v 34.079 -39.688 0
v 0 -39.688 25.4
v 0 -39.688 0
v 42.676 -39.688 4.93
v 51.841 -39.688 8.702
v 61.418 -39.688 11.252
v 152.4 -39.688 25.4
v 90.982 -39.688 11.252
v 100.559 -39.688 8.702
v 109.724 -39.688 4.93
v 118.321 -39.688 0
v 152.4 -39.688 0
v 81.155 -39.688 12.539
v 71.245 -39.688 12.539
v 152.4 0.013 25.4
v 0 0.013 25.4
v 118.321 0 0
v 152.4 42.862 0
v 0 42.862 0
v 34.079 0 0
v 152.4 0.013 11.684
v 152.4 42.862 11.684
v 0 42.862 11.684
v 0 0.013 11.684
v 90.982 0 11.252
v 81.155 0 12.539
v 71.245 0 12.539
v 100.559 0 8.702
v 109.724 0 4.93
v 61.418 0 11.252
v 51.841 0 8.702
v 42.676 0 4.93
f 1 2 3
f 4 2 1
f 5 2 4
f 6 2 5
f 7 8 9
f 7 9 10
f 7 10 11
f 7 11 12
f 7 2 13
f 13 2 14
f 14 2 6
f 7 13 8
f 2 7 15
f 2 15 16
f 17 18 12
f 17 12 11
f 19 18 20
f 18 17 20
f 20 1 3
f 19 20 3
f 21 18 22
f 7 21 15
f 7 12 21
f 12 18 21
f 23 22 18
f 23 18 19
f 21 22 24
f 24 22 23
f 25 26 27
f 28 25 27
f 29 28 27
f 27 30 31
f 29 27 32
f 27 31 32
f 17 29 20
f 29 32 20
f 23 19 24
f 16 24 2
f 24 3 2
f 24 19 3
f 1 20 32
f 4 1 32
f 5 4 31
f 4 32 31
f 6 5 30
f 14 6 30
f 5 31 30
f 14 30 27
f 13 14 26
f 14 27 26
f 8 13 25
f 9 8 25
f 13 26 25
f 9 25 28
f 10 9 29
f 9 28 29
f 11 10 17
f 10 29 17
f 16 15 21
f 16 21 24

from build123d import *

# Parameters (mm, degrees)
F1_DEPTH = 39.6875
F2_W     = 152.4
F2_H     = 25.4
F3_DEPTH = 42.8625
F4_W     = 152.4
F4_H     = 13.716
F5_DEPTH = 42.8498


with BuildPart() as f1:
    # F0 (on Front) → F1 (new body)
    with BuildSketch(Plane.XZ):
        with BuildLine():
            Line((0, 25.4), (0, 0))
            Line((0, 0), (34.078865, 0))
            ThreePointArc((34.078865, 0), (76.2, 12.7), (118.321135, 0))
            Line((118.321135, 0), (152.4, 0))
            Line((152.4, 0), (152.4, 25.4))
            Line((152.4, 25.4), (0, 25.4))
        make_face()
    extrude(amount=F1_DEPTH)

    # F2 (on face) → F3 (join)
    with BuildSketch(Plane(origin=(0, 0, 0), x_dir=(-1, 0, 0), z_dir=(0, 1, 0))):
        with Locations((-76.2, 12.7)):
            Rectangle(F2_W, F2_H)
    extrude(amount=F3_DEPTH)

    # F4 (on face) → F5 (cut)
    with BuildSketch(Plane(origin=(0, 42.8625, 0), x_dir=(-1, 0, 0), z_dir=(0, 1, 0))):
        with Locations((-76.2, 18.542)):
            Rectangle(F4_W, F4_H)
    extrude(amount=-F5_DEPTH, mode=Mode.SUBTRACT)


solid = f1.part
